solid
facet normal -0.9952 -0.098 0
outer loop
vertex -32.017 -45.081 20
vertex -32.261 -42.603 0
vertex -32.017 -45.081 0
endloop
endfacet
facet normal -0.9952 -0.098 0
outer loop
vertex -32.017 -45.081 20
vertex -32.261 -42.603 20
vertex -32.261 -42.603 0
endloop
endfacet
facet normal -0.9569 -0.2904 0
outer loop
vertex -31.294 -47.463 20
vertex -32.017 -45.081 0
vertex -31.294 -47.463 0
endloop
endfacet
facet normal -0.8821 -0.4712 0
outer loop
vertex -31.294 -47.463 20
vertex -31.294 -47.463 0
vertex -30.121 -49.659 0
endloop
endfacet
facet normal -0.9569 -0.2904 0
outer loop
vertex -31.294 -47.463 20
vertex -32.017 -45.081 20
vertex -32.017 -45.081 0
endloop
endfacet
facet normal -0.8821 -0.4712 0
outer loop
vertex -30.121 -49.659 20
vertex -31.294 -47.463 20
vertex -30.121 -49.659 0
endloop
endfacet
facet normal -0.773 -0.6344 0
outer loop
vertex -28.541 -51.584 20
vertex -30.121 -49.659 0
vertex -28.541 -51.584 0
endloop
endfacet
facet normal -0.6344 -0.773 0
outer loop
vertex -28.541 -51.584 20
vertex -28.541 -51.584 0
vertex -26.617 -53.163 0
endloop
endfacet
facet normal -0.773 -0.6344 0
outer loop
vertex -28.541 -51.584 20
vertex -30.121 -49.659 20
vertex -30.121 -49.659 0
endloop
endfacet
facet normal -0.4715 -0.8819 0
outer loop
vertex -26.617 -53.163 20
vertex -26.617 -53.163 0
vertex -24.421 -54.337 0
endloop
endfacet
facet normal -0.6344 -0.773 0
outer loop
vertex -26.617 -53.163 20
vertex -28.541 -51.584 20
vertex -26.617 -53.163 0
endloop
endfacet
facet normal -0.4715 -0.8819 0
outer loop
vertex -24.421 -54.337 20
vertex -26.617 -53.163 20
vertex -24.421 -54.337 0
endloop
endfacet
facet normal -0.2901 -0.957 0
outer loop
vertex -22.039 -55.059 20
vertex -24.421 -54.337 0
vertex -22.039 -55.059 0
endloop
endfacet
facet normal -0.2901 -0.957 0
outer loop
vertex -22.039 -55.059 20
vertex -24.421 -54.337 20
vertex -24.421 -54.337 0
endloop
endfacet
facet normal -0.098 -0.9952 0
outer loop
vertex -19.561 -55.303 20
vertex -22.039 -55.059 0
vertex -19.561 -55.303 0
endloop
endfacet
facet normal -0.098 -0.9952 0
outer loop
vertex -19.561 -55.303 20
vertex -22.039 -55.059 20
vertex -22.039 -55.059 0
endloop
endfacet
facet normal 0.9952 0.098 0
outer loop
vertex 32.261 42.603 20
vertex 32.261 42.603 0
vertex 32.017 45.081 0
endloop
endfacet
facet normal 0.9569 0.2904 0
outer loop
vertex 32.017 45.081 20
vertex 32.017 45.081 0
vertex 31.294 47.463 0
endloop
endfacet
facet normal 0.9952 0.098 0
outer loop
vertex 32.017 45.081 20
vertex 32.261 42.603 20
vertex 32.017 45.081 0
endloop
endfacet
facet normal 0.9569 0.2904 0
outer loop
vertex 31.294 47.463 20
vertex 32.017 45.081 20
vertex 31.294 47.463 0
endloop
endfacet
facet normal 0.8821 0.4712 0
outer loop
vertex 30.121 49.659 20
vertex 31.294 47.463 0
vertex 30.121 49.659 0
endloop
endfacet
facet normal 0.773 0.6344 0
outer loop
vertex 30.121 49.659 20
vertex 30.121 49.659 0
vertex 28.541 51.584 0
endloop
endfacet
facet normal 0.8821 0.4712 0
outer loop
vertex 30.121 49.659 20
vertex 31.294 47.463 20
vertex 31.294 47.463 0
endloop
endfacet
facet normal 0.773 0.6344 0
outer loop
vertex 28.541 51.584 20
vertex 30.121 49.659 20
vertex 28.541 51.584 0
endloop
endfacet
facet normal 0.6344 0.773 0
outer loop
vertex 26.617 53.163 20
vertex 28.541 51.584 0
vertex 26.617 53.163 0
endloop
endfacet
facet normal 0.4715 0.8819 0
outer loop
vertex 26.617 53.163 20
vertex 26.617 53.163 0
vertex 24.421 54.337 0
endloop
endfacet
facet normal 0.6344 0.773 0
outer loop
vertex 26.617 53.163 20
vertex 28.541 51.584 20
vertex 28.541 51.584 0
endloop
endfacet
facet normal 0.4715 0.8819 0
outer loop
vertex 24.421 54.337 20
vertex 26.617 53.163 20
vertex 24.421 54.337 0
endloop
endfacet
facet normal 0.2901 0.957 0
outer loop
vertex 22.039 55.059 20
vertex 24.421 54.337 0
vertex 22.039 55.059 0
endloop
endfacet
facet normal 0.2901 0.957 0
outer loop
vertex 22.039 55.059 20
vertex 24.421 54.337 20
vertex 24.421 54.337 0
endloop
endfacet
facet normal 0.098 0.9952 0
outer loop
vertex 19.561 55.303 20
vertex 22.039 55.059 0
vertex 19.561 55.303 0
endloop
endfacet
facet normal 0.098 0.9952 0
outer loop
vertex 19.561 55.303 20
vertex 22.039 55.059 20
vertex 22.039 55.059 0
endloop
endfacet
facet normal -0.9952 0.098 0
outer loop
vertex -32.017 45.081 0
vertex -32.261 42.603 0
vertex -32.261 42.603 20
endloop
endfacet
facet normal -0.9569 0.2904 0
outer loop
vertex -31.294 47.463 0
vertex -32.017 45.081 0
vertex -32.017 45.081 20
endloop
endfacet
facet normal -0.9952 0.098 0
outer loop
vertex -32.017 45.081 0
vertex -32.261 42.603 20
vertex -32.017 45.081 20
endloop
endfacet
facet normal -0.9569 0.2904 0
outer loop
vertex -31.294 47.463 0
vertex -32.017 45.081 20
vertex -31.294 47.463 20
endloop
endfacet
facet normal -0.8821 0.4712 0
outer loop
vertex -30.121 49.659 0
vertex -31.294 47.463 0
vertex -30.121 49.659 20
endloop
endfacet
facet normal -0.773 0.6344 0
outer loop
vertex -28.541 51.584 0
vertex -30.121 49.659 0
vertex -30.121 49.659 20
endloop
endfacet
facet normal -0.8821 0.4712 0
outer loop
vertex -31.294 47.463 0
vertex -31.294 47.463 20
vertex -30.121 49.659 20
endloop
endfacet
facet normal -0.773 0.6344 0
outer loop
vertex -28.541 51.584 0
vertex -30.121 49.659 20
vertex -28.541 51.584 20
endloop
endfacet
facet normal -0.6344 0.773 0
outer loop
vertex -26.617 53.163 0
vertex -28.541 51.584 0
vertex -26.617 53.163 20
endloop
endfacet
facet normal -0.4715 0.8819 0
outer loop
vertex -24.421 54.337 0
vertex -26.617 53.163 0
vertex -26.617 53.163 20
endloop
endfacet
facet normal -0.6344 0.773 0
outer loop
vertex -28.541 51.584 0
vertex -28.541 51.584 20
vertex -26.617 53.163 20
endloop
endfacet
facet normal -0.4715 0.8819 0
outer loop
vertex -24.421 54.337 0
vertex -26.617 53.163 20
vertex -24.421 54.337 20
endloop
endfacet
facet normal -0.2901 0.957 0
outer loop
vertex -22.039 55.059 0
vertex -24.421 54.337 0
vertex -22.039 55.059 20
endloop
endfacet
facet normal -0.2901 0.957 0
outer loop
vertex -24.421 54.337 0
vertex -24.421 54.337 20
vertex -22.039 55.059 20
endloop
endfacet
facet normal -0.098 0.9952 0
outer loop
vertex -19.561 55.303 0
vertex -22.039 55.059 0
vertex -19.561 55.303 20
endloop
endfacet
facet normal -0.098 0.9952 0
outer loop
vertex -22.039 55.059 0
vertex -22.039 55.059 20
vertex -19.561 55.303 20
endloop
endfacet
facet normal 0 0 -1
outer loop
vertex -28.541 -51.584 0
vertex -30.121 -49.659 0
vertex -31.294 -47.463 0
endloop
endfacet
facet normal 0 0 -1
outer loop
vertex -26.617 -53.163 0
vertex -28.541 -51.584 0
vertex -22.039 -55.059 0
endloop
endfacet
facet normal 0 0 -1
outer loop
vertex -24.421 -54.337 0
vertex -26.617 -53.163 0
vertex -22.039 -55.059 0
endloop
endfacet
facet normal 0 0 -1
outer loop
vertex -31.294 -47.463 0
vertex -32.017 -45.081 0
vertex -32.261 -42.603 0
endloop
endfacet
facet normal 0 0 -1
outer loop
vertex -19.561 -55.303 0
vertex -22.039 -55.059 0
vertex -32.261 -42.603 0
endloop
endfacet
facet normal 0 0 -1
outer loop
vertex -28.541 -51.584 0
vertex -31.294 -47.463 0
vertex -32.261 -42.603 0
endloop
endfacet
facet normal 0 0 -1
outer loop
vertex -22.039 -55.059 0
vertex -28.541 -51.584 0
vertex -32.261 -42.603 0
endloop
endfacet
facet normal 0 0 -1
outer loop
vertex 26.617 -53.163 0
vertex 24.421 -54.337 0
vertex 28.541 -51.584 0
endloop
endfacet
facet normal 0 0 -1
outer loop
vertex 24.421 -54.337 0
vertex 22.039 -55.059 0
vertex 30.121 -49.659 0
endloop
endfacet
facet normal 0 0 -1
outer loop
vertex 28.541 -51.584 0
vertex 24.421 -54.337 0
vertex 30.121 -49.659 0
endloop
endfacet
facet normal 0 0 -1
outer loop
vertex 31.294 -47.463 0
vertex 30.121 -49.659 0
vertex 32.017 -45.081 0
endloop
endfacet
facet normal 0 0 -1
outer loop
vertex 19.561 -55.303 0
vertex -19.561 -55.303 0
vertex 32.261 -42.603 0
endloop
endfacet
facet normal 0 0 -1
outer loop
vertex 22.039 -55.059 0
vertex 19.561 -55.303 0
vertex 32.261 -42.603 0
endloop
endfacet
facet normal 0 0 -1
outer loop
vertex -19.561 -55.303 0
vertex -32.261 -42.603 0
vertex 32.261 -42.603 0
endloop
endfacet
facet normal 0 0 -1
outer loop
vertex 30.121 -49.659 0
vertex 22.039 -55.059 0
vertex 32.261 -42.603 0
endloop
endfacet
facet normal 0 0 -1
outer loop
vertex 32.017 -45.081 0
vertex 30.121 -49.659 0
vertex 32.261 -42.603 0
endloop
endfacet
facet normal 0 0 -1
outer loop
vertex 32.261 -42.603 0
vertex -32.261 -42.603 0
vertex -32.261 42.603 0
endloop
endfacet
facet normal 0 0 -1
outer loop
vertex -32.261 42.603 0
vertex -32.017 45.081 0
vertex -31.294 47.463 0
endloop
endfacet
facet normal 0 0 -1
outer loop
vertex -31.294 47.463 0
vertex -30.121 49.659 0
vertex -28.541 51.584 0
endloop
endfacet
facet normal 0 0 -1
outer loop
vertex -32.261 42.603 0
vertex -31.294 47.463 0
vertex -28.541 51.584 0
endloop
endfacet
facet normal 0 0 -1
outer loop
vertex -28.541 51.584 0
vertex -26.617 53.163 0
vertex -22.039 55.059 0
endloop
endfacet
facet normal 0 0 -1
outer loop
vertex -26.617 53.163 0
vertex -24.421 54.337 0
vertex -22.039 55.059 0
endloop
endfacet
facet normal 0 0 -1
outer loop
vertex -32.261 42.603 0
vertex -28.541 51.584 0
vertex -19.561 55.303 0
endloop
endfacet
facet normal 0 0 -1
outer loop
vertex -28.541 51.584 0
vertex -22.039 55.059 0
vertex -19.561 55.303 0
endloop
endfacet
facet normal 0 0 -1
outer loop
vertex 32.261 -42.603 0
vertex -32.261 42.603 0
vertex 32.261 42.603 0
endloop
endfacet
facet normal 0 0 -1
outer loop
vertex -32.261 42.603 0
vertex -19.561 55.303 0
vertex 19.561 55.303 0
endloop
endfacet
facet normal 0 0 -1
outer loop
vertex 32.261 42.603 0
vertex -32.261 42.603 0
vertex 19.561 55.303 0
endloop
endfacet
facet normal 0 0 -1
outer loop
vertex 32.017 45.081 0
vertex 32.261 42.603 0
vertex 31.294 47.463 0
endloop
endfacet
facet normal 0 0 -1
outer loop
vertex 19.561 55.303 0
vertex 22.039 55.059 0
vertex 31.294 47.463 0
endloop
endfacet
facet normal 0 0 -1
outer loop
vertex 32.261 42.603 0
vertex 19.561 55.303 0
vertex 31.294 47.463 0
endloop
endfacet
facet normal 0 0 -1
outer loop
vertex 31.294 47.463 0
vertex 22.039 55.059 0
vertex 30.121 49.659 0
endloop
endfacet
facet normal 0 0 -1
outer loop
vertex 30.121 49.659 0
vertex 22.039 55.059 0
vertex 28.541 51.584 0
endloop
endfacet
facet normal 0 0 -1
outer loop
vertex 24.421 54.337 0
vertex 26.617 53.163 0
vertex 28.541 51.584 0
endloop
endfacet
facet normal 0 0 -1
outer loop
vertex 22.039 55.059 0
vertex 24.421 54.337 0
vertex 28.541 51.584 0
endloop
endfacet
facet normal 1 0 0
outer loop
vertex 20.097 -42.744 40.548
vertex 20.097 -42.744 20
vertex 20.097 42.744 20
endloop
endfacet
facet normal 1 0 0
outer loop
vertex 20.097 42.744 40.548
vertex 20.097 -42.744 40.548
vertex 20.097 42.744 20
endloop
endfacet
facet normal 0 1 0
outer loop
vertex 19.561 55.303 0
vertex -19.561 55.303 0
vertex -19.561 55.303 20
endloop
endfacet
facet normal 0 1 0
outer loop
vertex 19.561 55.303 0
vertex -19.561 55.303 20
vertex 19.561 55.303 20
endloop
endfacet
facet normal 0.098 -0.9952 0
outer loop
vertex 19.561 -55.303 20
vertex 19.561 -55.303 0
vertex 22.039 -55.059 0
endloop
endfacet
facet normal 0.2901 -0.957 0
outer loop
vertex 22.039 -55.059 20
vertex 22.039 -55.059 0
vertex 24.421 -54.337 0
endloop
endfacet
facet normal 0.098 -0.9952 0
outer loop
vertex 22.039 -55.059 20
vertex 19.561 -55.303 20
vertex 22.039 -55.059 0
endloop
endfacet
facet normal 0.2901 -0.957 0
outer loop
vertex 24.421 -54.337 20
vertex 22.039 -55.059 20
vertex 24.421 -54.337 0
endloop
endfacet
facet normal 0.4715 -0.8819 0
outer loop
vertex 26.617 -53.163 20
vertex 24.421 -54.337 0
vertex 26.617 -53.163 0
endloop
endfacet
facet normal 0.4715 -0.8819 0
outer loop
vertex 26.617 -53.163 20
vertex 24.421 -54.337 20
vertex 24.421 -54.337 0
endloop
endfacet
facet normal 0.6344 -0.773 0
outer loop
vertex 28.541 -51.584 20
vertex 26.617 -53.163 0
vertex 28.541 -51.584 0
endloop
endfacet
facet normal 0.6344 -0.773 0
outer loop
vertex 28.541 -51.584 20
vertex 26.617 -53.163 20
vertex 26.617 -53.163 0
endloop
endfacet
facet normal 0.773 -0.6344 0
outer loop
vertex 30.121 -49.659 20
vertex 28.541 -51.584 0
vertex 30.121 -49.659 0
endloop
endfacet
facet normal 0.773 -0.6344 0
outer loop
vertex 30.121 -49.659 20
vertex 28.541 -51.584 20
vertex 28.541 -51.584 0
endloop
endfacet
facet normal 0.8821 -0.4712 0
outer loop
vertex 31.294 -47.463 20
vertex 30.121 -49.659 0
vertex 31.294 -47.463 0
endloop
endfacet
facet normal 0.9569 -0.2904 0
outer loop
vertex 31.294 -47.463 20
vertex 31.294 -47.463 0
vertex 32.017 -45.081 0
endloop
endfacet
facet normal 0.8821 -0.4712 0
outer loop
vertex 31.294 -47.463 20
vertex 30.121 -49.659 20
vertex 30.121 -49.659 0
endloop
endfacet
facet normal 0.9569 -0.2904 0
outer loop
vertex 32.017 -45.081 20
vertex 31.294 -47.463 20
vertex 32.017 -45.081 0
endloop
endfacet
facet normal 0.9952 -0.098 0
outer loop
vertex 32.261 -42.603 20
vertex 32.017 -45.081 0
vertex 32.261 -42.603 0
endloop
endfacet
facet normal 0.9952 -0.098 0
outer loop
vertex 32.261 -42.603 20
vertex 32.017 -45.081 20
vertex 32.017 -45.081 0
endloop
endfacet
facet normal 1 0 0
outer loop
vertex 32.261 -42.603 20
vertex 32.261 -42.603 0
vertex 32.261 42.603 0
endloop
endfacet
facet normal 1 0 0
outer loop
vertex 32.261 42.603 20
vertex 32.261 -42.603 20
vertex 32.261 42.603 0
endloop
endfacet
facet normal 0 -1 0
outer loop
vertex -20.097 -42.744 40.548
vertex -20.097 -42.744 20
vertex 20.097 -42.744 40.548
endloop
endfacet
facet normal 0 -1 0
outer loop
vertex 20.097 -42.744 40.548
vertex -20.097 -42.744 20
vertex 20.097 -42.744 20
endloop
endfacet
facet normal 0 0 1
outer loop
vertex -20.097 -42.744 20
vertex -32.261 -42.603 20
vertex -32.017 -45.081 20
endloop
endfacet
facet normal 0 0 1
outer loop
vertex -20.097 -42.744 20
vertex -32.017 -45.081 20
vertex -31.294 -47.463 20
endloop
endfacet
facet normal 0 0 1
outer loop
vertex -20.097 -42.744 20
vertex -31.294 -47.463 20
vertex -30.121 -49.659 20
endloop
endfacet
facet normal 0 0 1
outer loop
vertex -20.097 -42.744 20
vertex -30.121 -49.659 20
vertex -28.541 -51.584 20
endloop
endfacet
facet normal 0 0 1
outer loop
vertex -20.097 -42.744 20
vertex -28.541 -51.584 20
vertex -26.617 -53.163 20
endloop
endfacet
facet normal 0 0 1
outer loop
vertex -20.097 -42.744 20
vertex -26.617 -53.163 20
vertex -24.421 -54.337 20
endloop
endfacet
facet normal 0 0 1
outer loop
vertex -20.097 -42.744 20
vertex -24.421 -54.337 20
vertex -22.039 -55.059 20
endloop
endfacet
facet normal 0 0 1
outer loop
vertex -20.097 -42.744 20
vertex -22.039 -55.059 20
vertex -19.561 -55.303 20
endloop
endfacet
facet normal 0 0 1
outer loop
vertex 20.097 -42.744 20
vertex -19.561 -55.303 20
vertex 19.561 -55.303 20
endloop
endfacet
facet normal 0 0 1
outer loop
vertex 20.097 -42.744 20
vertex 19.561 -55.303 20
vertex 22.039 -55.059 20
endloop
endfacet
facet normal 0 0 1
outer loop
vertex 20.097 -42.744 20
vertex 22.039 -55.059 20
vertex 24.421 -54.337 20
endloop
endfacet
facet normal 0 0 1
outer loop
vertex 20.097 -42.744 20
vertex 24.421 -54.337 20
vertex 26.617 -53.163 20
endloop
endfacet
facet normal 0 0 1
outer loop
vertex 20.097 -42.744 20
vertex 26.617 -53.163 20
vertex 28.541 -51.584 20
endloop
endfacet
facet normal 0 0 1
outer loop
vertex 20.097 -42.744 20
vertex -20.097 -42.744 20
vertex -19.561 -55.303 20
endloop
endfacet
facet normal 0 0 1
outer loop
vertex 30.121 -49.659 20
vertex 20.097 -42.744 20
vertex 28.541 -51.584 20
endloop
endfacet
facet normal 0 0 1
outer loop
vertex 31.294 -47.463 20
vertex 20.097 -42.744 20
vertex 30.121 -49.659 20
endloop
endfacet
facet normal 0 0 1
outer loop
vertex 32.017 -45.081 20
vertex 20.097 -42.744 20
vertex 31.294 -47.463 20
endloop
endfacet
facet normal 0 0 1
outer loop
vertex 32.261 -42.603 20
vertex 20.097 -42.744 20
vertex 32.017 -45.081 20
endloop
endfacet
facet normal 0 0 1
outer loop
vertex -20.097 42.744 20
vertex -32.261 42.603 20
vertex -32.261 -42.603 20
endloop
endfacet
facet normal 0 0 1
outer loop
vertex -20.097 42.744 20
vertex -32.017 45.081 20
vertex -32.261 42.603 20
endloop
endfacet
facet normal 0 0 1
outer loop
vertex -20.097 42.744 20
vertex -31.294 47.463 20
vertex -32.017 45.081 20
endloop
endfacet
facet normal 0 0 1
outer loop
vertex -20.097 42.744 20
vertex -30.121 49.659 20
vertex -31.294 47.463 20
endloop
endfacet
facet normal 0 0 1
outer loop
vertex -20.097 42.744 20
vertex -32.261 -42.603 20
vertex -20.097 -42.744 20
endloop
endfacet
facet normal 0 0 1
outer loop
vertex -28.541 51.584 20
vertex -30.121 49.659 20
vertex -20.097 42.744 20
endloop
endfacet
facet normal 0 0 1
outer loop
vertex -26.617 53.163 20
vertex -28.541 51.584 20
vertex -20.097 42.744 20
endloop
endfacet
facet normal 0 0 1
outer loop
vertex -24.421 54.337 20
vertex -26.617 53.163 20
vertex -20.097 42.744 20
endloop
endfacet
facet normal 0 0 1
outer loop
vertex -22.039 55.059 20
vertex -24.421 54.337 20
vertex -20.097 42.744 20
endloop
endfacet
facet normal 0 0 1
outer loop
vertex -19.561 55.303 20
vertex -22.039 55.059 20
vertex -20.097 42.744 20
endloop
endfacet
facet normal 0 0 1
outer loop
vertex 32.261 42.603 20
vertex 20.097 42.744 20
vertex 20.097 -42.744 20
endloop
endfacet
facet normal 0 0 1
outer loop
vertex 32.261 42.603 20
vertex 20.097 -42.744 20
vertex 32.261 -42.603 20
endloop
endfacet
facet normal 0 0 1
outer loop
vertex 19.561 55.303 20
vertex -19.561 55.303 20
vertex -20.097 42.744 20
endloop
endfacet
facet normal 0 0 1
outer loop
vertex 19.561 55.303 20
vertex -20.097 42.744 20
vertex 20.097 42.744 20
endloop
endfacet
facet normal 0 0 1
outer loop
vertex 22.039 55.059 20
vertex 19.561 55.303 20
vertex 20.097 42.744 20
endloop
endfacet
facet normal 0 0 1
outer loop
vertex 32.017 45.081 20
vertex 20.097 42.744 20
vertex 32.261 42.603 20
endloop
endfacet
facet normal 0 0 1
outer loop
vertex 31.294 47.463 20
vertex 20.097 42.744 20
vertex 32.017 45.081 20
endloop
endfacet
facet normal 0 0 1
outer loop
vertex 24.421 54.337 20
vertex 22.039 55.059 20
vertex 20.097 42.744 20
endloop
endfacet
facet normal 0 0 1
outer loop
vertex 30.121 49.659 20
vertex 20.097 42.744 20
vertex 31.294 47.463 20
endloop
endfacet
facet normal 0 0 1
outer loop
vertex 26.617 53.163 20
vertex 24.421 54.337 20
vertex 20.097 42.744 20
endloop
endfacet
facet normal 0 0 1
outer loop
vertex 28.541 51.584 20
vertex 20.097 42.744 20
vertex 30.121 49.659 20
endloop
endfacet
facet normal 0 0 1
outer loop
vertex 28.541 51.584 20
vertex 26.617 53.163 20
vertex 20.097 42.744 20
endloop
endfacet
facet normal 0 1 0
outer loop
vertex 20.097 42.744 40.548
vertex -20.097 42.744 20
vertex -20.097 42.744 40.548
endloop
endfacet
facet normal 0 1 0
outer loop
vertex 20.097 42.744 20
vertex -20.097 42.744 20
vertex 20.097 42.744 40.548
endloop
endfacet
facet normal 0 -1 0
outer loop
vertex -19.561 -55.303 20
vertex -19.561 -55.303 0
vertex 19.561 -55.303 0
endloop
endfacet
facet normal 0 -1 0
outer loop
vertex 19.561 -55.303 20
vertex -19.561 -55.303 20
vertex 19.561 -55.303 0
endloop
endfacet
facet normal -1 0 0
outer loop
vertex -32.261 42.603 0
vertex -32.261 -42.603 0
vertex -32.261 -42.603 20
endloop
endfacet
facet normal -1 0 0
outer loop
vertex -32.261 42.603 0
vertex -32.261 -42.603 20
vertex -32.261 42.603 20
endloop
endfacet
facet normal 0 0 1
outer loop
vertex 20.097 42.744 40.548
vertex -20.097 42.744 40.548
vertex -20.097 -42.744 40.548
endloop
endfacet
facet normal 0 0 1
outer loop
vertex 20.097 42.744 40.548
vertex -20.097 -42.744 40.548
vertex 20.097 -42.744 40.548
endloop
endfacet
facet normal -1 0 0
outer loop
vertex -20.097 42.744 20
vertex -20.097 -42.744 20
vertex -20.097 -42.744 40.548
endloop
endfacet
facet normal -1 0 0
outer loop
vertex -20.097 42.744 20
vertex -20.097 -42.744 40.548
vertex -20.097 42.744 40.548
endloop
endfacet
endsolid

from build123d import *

# Parameters (mm, degrees)
F0_W     = 64.522118
F0_H     = 110.606628
F1_DEPTH = 20
F2_R     = 12.7
F3_W     = 40.194572
F3_H     = 85.488498
F4_DEPTH = 40.548261


with BuildPart() as f1:
    # F0 (on Top) → F1 (new body)
    with BuildSketch(Plane.XY):
        Rectangle(F0_W, F0_H)
    extrude(amount=F1_DEPTH)

    # F2
    f2_edges = [f1.edges().sort_by_distance(p)[0] for p in [
        (-32.261059, 55.303314, 10),
        (-32.261059, -55.303314, 10),
        (32.261059, 55.303314, 10),
        (32.261059, -55.303314, 10),
    ]]
    fillet(f2_edges, radius=F2_R)

    # F3 (on Top) → F4 (join)
    with BuildSketch(Plane.XY):
        Rectangle(F3_W, F3_H)
    extrude(amount=F4_DEPTH)


solid = f1.part
